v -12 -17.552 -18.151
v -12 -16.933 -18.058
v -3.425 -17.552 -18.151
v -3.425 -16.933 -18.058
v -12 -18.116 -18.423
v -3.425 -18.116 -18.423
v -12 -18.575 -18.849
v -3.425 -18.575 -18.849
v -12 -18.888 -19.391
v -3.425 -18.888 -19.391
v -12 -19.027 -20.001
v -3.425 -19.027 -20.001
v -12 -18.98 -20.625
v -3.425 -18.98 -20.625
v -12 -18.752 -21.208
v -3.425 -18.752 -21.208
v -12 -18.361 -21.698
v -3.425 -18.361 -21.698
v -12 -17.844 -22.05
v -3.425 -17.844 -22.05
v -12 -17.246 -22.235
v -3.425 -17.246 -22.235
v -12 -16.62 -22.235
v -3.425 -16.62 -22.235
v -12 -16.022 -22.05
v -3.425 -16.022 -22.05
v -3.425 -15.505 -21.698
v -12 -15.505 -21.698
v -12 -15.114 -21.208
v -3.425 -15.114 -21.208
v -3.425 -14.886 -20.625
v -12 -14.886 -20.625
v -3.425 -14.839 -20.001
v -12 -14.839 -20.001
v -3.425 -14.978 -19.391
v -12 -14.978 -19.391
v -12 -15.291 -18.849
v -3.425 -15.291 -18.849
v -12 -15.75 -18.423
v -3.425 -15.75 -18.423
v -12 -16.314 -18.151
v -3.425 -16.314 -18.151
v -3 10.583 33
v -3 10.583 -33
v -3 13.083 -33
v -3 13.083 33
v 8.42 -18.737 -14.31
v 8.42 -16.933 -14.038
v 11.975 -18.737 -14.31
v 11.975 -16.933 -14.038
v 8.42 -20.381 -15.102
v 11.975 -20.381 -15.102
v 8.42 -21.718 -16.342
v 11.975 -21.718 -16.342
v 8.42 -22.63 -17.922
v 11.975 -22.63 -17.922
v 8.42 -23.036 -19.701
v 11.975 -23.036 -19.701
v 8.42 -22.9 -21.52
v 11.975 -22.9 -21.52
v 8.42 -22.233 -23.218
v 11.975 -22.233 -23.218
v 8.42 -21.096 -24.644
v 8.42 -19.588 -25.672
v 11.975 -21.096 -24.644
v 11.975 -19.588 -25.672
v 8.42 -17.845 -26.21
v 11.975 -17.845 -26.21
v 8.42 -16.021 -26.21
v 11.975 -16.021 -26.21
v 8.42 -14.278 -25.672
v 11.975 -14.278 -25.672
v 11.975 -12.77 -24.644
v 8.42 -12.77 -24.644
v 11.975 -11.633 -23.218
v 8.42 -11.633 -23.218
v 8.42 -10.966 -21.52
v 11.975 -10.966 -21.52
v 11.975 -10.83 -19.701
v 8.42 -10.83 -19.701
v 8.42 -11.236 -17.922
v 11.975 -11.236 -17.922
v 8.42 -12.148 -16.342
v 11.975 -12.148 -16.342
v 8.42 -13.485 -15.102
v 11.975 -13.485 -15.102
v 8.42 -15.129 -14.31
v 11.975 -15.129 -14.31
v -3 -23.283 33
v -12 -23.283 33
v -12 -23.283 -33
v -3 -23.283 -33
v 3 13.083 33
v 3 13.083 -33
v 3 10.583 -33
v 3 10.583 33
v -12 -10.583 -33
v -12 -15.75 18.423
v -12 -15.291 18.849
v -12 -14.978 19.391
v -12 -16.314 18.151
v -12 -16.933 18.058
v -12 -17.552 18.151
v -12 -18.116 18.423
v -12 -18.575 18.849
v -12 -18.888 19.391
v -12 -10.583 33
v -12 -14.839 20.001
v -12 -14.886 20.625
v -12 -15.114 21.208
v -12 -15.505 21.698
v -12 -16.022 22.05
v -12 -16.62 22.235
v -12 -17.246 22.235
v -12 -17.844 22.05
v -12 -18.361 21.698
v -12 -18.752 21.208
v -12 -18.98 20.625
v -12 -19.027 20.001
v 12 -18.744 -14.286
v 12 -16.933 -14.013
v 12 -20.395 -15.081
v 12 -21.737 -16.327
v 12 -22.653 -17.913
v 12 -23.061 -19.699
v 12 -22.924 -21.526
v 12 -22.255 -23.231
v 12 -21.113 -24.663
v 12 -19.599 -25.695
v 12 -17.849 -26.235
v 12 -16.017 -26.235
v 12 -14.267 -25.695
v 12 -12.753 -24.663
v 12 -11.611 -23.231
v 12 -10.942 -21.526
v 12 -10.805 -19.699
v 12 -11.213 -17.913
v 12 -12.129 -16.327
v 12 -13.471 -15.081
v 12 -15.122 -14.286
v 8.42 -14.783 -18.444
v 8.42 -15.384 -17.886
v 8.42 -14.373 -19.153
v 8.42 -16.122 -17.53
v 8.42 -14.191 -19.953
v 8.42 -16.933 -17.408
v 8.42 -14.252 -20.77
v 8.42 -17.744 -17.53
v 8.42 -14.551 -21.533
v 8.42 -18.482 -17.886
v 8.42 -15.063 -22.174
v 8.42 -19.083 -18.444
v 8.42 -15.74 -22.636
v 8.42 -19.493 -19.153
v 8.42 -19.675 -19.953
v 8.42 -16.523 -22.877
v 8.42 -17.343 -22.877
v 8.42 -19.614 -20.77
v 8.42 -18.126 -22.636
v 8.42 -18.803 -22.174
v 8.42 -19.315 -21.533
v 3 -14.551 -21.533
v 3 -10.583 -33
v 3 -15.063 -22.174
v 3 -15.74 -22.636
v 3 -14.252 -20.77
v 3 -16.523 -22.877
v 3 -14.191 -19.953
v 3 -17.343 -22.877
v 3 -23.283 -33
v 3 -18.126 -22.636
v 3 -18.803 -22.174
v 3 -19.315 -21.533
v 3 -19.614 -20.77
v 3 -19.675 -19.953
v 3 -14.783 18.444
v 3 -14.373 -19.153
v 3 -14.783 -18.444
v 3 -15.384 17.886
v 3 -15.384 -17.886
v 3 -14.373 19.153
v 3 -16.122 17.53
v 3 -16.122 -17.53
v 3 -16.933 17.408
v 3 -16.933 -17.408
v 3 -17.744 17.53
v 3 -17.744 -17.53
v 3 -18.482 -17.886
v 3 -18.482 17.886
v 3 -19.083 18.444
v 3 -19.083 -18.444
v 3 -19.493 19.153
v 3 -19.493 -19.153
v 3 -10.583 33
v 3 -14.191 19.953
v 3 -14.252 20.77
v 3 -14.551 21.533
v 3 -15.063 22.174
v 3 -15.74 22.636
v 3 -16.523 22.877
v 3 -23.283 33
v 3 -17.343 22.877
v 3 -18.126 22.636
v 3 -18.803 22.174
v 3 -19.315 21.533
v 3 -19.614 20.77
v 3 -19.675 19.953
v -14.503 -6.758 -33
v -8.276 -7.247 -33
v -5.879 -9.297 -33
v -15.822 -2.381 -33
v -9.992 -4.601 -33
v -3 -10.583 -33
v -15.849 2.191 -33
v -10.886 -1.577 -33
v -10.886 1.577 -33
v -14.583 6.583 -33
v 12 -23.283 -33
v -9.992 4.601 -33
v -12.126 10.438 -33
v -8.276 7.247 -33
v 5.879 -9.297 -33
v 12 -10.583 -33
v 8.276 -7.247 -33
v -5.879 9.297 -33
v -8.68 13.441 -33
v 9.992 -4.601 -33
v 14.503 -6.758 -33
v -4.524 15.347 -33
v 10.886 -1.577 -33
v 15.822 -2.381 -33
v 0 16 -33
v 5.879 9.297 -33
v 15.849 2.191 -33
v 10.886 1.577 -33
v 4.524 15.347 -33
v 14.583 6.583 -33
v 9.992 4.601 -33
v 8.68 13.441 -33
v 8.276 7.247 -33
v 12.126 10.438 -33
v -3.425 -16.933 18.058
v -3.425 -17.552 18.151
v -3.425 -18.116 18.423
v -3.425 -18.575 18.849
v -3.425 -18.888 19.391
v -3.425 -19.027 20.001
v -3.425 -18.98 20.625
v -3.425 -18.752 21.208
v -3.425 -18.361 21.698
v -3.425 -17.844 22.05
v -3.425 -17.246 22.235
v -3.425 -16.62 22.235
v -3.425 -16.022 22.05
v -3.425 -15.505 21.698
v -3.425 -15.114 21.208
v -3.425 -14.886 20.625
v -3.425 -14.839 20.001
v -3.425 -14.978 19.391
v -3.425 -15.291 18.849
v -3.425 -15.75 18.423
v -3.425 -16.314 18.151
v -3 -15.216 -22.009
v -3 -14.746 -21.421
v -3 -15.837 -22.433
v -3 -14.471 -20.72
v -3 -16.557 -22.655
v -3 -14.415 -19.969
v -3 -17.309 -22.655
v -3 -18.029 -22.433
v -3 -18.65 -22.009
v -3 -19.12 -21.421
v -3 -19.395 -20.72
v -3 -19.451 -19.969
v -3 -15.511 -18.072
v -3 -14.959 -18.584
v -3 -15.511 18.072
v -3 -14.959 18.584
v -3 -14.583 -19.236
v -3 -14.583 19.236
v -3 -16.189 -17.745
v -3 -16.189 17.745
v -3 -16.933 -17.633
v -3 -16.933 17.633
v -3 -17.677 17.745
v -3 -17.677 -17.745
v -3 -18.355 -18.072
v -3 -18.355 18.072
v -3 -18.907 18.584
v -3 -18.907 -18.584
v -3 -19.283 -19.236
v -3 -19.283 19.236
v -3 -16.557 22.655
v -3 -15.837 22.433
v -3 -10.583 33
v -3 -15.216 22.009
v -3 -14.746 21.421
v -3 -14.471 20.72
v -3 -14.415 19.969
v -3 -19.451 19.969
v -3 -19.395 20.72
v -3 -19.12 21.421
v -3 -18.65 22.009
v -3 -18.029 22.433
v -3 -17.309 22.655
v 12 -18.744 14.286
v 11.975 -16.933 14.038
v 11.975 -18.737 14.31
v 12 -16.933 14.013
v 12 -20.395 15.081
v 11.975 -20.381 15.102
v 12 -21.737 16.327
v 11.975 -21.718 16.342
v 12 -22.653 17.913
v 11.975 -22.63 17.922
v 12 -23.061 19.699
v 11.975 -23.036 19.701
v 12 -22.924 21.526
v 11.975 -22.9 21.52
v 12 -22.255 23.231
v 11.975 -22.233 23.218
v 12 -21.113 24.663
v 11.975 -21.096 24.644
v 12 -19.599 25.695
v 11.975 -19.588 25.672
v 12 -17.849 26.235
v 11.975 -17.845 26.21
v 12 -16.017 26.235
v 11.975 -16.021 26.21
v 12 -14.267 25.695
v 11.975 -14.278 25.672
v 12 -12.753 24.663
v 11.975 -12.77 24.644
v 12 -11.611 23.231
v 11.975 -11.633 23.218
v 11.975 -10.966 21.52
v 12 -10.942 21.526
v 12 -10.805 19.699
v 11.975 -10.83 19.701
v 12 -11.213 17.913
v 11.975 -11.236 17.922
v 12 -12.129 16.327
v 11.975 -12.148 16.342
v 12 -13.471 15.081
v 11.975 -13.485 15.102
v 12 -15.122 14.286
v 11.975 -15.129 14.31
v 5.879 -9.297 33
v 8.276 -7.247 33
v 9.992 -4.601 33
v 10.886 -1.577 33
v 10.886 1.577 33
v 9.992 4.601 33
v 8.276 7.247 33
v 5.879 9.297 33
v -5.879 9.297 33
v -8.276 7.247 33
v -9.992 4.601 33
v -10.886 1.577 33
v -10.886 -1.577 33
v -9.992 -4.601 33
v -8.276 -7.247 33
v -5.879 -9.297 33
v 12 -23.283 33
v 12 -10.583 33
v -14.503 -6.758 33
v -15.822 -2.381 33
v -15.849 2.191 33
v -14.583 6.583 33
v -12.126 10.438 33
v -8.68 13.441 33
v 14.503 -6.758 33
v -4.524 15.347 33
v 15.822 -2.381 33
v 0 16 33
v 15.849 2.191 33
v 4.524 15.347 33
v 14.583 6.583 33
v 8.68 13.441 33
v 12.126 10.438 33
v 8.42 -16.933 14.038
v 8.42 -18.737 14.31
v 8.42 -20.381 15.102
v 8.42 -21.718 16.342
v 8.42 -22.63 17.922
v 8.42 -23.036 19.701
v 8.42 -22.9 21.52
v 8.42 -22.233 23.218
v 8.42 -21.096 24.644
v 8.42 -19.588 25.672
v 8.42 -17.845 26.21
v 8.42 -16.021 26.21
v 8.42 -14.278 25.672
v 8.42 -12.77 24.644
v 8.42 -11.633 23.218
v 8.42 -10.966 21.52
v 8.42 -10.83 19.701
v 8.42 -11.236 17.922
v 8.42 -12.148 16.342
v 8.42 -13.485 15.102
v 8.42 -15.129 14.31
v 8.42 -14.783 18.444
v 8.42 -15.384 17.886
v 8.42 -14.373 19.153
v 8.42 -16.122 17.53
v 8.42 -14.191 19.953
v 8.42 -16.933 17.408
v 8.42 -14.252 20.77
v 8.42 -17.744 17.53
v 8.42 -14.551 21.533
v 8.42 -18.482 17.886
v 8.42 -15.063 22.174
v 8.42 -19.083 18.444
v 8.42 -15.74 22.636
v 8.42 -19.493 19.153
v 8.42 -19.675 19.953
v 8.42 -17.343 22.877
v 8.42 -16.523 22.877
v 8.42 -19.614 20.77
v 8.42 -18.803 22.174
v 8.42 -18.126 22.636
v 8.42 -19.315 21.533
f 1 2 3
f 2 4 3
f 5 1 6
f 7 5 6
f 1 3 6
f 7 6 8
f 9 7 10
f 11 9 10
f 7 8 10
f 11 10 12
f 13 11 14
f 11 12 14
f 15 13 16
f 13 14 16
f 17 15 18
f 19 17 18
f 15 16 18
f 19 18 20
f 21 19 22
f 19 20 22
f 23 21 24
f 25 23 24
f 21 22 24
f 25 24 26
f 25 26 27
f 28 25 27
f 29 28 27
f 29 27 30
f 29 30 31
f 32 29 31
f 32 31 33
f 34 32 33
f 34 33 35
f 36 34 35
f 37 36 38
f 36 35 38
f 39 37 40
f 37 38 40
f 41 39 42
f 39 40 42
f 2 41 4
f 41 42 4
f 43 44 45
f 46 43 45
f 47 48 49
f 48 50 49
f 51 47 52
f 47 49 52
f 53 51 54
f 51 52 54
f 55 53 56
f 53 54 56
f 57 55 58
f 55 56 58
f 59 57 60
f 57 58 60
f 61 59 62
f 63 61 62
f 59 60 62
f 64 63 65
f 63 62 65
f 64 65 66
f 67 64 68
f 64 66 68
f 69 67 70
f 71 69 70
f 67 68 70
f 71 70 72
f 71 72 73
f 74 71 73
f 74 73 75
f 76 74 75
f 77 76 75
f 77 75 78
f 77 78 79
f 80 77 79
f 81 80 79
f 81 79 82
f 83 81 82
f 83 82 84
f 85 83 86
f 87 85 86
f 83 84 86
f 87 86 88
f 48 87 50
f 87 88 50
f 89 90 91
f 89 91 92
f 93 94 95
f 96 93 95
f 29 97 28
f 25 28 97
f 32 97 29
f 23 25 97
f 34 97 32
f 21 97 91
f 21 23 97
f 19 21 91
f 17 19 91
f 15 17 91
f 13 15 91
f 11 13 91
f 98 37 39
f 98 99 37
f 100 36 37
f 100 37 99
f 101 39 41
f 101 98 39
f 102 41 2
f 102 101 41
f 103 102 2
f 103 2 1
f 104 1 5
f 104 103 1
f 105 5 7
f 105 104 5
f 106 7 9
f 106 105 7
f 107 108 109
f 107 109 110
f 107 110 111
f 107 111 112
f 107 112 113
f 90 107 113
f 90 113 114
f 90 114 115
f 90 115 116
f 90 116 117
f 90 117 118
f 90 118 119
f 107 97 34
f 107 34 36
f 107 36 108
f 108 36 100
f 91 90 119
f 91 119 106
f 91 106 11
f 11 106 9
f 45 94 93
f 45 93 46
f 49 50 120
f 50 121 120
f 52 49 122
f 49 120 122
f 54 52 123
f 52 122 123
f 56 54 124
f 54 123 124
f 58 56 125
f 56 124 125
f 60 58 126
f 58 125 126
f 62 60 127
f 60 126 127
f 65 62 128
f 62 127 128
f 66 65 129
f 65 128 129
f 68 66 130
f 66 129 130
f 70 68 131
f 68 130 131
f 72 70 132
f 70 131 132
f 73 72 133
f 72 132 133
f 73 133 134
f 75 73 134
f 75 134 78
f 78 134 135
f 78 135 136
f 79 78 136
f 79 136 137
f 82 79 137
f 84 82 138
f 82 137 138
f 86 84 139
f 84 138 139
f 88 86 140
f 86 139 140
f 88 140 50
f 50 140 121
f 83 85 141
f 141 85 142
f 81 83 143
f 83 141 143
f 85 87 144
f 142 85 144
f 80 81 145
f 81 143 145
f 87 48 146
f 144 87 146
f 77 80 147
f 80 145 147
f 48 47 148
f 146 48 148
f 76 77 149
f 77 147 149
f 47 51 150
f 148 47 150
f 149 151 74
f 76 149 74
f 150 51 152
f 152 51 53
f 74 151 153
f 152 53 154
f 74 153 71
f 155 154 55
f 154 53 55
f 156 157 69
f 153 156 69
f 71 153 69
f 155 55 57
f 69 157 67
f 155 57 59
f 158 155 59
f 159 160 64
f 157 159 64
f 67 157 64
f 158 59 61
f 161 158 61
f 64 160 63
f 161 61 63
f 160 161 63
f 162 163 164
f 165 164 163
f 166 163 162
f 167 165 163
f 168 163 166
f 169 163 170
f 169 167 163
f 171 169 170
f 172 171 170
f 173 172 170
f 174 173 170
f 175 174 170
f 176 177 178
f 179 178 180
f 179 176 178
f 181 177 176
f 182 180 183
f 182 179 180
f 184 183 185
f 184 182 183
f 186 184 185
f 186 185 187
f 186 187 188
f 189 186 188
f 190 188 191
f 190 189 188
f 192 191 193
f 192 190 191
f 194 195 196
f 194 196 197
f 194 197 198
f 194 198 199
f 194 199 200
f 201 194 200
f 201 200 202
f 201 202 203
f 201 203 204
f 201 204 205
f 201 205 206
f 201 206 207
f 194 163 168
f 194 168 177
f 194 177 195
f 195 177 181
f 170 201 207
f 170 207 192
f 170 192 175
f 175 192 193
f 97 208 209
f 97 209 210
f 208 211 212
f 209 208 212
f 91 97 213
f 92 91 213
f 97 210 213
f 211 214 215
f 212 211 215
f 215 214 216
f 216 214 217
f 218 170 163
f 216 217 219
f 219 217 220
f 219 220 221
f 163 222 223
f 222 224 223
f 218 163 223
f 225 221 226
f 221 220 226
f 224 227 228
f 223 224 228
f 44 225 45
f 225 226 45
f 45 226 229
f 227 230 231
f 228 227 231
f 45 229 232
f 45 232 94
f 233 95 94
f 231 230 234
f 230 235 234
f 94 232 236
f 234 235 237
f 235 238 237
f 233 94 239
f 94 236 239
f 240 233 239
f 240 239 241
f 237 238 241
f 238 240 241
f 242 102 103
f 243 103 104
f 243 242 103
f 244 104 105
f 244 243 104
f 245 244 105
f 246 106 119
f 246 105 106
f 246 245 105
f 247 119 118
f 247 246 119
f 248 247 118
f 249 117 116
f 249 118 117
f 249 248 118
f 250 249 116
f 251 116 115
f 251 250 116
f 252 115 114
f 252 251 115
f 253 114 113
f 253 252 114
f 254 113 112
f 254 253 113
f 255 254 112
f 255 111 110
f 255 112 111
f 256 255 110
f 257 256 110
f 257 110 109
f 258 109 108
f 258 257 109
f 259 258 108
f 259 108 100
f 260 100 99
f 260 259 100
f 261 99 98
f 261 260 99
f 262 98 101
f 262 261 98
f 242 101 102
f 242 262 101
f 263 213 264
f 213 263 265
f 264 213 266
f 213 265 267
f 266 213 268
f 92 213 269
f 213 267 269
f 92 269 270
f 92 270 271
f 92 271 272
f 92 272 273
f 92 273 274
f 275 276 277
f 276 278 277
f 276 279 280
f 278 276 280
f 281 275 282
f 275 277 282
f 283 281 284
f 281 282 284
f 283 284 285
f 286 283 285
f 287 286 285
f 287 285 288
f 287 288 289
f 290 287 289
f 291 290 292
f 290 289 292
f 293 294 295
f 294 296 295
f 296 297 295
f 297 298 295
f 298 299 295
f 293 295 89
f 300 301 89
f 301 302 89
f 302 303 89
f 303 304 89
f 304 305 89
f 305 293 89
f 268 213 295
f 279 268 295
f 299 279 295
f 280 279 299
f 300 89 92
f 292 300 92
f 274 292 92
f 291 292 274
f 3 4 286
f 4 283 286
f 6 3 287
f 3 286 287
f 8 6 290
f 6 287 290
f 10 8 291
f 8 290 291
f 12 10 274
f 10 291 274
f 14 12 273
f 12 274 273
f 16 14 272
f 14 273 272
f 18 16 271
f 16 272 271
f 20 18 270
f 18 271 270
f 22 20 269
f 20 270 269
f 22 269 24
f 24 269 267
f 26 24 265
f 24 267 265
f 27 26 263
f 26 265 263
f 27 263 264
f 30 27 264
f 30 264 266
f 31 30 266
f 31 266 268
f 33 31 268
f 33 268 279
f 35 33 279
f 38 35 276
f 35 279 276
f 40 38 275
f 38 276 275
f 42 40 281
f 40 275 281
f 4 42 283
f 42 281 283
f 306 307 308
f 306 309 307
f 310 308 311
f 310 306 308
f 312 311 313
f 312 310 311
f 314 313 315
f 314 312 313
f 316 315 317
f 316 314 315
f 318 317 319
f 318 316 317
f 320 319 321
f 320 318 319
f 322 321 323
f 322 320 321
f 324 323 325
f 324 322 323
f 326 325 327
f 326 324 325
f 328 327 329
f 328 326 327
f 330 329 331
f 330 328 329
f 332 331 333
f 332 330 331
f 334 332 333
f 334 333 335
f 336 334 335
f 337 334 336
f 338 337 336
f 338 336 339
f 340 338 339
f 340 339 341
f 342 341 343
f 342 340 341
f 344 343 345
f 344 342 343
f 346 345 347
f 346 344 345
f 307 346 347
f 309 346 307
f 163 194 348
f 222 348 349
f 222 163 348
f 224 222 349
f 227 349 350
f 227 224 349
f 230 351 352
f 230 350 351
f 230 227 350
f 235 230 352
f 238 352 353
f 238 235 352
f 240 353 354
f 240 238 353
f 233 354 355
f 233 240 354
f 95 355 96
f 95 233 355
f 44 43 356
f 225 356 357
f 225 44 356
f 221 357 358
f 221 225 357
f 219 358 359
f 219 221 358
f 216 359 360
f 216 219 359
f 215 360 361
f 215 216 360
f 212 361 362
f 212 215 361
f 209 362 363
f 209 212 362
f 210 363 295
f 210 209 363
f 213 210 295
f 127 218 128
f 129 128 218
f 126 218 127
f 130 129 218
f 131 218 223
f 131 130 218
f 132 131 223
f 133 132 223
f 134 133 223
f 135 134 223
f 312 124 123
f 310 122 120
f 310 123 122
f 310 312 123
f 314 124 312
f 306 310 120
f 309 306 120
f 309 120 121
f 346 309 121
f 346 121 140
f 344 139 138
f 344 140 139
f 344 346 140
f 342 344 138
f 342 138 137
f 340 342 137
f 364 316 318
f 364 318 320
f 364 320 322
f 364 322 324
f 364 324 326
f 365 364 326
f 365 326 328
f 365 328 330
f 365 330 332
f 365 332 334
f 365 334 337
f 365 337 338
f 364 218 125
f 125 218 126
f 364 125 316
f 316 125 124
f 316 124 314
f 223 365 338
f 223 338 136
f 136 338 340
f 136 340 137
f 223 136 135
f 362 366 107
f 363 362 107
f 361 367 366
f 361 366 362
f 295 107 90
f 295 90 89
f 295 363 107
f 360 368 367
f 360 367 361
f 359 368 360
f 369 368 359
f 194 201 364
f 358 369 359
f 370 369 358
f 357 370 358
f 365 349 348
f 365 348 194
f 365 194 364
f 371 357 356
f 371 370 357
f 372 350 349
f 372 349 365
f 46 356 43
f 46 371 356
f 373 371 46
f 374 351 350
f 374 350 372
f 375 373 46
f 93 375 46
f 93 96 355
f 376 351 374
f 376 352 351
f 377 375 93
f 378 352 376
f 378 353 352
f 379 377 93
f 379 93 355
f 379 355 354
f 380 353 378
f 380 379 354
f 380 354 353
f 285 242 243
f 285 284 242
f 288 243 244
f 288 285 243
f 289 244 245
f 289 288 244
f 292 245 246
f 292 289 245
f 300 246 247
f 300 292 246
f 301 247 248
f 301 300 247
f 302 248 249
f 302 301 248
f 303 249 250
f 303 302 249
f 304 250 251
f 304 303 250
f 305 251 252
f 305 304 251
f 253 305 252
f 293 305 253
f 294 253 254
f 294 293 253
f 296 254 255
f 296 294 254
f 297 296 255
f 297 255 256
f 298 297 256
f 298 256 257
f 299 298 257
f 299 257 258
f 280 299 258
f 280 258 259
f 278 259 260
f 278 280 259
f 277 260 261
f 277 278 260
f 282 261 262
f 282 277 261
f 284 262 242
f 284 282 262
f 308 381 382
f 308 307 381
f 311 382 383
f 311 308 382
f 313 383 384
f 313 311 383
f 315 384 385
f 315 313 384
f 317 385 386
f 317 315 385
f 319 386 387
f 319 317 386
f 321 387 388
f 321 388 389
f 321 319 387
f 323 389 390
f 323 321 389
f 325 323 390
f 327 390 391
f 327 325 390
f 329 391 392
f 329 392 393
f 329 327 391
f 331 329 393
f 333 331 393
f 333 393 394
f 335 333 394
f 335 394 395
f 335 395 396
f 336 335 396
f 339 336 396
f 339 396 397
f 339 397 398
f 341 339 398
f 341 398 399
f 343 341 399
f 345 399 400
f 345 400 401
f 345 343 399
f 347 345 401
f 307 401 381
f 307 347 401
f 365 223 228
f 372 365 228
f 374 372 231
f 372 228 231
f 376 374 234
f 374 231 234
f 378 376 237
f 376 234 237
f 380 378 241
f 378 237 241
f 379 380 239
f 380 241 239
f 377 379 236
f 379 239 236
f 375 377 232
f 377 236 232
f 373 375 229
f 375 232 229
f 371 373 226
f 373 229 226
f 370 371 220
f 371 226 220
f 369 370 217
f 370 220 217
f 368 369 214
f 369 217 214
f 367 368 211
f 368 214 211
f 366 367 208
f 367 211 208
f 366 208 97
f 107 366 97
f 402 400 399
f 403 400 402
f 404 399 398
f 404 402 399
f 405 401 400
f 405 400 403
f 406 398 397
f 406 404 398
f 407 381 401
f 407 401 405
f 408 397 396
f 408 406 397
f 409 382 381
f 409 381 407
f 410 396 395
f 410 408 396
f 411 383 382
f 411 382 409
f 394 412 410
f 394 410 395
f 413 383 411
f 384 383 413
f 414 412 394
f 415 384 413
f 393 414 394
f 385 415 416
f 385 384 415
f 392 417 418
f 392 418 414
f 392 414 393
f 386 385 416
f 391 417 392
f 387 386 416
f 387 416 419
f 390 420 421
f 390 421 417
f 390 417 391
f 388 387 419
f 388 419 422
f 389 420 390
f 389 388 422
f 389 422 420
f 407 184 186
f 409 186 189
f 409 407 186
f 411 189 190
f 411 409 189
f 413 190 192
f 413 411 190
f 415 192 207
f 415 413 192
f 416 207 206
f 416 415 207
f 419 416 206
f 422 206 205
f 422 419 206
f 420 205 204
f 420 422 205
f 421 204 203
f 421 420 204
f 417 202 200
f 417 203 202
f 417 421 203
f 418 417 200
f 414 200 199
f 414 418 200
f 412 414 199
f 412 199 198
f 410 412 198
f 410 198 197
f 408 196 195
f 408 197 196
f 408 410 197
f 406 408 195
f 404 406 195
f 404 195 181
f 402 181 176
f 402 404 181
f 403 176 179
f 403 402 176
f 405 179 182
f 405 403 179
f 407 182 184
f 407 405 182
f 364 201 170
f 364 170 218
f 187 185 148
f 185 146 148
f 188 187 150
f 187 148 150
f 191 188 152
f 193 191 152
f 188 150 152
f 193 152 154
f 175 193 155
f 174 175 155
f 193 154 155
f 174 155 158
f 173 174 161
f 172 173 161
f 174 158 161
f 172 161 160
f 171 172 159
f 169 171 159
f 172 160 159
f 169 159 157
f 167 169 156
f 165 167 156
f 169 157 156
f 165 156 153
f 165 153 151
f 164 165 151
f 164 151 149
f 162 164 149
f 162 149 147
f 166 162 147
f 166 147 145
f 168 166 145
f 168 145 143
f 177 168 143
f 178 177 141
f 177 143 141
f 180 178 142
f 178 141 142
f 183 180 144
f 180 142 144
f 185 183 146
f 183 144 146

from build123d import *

# Parameters (mm, degrees)
BOSS_EXTRUDE1_DEPTH      = 33
BOSS_EXTRUDE1_DEPTH_BACK = 33
SKETCH1_R                = 16
SKETCH1_R_2              = 11
CUT_EXTRUDE1_DEPTH       = 33
BOSS_EXTRUDE2_DEPTH      = 66
CUT_EXTRUDE4_DEPTH       = 72.792049234


with BuildPart() as part:
    # Sketch1 → Boss-Extrude1 (new, two sides: drawn at the far end of the back side and taken through both)
    with BuildSketch(Plane.XY.offset(-BOSS_EXTRUDE1_DEPTH_BACK)):
        Circle(SKETCH1_R)
        Circle(SKETCH1_R_2, mode=Mode.SUBTRACT)
    extrude(amount=BOSS_EXTRUDE1_DEPTH + BOSS_EXTRUDE1_DEPTH_BACK)

    # Sketch2 → Cut-Extrude1 (cut)
    with BuildSketch(Plane.XY.offset(33)):
        Polygon((-3, 10.583005244), (-3, 13.083005244), (0, 13.083005244), (3, 13.083005244), (3, 10.583005244), align=None)
    cut_extrude1 = extrude(amount=-CUT_EXTRUDE1_DEPTH, mode=Mode.SUBTRACT)

    # Mirror2: Cut-Extrude1 across plane
    add(cut_extrude1.mirror(Plane(origin=(0, 0, 0), x_dir=(1, 0, 0), z_dir=(0, 0, -1))), mode=Mode.SUBTRACT)

    # Sketch3 → Boss-Extrude2 (add, through all)
    with BuildSketch(Plane.XY.offset(33)):
        with BuildLine():
            Line((-3, -23.283005244), (-3, -15.716233646))
            ThreePointArc((-3, -15.716233646), (-7.927011319, -13.898290958), (-12, -10.583005244))
            Line((-12, -10.583005244), (-12, -23.283005244))
            Line((-12, -23.283005244), (-3, -23.283005244))
        make_face()
        with BuildLine():
            ThreePointArc((12, -10.583005244), (7.927011319, -13.898290958), (3, -15.716233646))
            Line((3, -15.716233646), (3, -23.283005244))
            Line((3, -23.283005244), (12, -23.283005244))
            Line((12, -23.283005244), (12, -10.583005244))
        make_face()
    extrude(amount=-BOSS_EXTRUDE2_DEPTH)

    # Sketch4 → Cut-Extrude4 (cut, through all)
    with BuildSketch(Plane.XY.offset(33)):
        Polygon((-3, -10.583005244), (-3, -16.271539673), (3, -16.271539673), (3, -15.716233646), (3, -10.583005244), align=None)
    extrude(amount=-CUT_EXTRUDE4_DEPTH, mode=Mode.SUBTRACT)

    # Sketch10 → CBORE for M5 Hex Head Bolt3 (revolve, cut)
    with BuildSketch(Plane(origin=(12, -16.933005244, 20.158167141), x_dir=(0, 0, -1), z_dir=(0, 1, 0))):
        Polygon((0, 0), (0, 11.652366702), (2.75, 10), (2.75, 3.58), (6.12, 3.58), (6.12, 0.025), (6.145, 0), align=None)
    cbore_for_m5_hex_head_bolt3 = revolve(axis=Axis((18.35, -16.933005244, 20.158167141), (-1, 0, 0)), mode=Mode.SUBTRACT)

    # Mirror3: CBORE for M5 Hex Head Bolt3 across plane
    add(cbore_for_m5_hex_head_bolt3.mirror(Plane.XY), mode=Mode.SUBTRACT)

    # Sketch14 → M5x0.8 Tapped Hole1 (revolve, cut)
    with BuildSketch(Plane(origin=(-3, -16.933005244, 20.158167141), x_dir=(0, 0, -1), z_dir=(0, 1, 0))):
        Polygon((0, 0), (0, 13.6618073), (2.1, 12.4), (2.1, 0.425), (2.525, 0), align=None)
    m5x0_8_tapped_hole1 = revolve(axis=Axis((3.35, -16.933005244, 20.158167141), (-1, 0, 0)), mode=Mode.SUBTRACT)

    # Mirror4: M5x0.8 Tapped Hole1 across plane
    add(m5x0_8_tapped_hole1.mirror(Plane.XY), mode=Mode.SUBTRACT)


solid = part.part
